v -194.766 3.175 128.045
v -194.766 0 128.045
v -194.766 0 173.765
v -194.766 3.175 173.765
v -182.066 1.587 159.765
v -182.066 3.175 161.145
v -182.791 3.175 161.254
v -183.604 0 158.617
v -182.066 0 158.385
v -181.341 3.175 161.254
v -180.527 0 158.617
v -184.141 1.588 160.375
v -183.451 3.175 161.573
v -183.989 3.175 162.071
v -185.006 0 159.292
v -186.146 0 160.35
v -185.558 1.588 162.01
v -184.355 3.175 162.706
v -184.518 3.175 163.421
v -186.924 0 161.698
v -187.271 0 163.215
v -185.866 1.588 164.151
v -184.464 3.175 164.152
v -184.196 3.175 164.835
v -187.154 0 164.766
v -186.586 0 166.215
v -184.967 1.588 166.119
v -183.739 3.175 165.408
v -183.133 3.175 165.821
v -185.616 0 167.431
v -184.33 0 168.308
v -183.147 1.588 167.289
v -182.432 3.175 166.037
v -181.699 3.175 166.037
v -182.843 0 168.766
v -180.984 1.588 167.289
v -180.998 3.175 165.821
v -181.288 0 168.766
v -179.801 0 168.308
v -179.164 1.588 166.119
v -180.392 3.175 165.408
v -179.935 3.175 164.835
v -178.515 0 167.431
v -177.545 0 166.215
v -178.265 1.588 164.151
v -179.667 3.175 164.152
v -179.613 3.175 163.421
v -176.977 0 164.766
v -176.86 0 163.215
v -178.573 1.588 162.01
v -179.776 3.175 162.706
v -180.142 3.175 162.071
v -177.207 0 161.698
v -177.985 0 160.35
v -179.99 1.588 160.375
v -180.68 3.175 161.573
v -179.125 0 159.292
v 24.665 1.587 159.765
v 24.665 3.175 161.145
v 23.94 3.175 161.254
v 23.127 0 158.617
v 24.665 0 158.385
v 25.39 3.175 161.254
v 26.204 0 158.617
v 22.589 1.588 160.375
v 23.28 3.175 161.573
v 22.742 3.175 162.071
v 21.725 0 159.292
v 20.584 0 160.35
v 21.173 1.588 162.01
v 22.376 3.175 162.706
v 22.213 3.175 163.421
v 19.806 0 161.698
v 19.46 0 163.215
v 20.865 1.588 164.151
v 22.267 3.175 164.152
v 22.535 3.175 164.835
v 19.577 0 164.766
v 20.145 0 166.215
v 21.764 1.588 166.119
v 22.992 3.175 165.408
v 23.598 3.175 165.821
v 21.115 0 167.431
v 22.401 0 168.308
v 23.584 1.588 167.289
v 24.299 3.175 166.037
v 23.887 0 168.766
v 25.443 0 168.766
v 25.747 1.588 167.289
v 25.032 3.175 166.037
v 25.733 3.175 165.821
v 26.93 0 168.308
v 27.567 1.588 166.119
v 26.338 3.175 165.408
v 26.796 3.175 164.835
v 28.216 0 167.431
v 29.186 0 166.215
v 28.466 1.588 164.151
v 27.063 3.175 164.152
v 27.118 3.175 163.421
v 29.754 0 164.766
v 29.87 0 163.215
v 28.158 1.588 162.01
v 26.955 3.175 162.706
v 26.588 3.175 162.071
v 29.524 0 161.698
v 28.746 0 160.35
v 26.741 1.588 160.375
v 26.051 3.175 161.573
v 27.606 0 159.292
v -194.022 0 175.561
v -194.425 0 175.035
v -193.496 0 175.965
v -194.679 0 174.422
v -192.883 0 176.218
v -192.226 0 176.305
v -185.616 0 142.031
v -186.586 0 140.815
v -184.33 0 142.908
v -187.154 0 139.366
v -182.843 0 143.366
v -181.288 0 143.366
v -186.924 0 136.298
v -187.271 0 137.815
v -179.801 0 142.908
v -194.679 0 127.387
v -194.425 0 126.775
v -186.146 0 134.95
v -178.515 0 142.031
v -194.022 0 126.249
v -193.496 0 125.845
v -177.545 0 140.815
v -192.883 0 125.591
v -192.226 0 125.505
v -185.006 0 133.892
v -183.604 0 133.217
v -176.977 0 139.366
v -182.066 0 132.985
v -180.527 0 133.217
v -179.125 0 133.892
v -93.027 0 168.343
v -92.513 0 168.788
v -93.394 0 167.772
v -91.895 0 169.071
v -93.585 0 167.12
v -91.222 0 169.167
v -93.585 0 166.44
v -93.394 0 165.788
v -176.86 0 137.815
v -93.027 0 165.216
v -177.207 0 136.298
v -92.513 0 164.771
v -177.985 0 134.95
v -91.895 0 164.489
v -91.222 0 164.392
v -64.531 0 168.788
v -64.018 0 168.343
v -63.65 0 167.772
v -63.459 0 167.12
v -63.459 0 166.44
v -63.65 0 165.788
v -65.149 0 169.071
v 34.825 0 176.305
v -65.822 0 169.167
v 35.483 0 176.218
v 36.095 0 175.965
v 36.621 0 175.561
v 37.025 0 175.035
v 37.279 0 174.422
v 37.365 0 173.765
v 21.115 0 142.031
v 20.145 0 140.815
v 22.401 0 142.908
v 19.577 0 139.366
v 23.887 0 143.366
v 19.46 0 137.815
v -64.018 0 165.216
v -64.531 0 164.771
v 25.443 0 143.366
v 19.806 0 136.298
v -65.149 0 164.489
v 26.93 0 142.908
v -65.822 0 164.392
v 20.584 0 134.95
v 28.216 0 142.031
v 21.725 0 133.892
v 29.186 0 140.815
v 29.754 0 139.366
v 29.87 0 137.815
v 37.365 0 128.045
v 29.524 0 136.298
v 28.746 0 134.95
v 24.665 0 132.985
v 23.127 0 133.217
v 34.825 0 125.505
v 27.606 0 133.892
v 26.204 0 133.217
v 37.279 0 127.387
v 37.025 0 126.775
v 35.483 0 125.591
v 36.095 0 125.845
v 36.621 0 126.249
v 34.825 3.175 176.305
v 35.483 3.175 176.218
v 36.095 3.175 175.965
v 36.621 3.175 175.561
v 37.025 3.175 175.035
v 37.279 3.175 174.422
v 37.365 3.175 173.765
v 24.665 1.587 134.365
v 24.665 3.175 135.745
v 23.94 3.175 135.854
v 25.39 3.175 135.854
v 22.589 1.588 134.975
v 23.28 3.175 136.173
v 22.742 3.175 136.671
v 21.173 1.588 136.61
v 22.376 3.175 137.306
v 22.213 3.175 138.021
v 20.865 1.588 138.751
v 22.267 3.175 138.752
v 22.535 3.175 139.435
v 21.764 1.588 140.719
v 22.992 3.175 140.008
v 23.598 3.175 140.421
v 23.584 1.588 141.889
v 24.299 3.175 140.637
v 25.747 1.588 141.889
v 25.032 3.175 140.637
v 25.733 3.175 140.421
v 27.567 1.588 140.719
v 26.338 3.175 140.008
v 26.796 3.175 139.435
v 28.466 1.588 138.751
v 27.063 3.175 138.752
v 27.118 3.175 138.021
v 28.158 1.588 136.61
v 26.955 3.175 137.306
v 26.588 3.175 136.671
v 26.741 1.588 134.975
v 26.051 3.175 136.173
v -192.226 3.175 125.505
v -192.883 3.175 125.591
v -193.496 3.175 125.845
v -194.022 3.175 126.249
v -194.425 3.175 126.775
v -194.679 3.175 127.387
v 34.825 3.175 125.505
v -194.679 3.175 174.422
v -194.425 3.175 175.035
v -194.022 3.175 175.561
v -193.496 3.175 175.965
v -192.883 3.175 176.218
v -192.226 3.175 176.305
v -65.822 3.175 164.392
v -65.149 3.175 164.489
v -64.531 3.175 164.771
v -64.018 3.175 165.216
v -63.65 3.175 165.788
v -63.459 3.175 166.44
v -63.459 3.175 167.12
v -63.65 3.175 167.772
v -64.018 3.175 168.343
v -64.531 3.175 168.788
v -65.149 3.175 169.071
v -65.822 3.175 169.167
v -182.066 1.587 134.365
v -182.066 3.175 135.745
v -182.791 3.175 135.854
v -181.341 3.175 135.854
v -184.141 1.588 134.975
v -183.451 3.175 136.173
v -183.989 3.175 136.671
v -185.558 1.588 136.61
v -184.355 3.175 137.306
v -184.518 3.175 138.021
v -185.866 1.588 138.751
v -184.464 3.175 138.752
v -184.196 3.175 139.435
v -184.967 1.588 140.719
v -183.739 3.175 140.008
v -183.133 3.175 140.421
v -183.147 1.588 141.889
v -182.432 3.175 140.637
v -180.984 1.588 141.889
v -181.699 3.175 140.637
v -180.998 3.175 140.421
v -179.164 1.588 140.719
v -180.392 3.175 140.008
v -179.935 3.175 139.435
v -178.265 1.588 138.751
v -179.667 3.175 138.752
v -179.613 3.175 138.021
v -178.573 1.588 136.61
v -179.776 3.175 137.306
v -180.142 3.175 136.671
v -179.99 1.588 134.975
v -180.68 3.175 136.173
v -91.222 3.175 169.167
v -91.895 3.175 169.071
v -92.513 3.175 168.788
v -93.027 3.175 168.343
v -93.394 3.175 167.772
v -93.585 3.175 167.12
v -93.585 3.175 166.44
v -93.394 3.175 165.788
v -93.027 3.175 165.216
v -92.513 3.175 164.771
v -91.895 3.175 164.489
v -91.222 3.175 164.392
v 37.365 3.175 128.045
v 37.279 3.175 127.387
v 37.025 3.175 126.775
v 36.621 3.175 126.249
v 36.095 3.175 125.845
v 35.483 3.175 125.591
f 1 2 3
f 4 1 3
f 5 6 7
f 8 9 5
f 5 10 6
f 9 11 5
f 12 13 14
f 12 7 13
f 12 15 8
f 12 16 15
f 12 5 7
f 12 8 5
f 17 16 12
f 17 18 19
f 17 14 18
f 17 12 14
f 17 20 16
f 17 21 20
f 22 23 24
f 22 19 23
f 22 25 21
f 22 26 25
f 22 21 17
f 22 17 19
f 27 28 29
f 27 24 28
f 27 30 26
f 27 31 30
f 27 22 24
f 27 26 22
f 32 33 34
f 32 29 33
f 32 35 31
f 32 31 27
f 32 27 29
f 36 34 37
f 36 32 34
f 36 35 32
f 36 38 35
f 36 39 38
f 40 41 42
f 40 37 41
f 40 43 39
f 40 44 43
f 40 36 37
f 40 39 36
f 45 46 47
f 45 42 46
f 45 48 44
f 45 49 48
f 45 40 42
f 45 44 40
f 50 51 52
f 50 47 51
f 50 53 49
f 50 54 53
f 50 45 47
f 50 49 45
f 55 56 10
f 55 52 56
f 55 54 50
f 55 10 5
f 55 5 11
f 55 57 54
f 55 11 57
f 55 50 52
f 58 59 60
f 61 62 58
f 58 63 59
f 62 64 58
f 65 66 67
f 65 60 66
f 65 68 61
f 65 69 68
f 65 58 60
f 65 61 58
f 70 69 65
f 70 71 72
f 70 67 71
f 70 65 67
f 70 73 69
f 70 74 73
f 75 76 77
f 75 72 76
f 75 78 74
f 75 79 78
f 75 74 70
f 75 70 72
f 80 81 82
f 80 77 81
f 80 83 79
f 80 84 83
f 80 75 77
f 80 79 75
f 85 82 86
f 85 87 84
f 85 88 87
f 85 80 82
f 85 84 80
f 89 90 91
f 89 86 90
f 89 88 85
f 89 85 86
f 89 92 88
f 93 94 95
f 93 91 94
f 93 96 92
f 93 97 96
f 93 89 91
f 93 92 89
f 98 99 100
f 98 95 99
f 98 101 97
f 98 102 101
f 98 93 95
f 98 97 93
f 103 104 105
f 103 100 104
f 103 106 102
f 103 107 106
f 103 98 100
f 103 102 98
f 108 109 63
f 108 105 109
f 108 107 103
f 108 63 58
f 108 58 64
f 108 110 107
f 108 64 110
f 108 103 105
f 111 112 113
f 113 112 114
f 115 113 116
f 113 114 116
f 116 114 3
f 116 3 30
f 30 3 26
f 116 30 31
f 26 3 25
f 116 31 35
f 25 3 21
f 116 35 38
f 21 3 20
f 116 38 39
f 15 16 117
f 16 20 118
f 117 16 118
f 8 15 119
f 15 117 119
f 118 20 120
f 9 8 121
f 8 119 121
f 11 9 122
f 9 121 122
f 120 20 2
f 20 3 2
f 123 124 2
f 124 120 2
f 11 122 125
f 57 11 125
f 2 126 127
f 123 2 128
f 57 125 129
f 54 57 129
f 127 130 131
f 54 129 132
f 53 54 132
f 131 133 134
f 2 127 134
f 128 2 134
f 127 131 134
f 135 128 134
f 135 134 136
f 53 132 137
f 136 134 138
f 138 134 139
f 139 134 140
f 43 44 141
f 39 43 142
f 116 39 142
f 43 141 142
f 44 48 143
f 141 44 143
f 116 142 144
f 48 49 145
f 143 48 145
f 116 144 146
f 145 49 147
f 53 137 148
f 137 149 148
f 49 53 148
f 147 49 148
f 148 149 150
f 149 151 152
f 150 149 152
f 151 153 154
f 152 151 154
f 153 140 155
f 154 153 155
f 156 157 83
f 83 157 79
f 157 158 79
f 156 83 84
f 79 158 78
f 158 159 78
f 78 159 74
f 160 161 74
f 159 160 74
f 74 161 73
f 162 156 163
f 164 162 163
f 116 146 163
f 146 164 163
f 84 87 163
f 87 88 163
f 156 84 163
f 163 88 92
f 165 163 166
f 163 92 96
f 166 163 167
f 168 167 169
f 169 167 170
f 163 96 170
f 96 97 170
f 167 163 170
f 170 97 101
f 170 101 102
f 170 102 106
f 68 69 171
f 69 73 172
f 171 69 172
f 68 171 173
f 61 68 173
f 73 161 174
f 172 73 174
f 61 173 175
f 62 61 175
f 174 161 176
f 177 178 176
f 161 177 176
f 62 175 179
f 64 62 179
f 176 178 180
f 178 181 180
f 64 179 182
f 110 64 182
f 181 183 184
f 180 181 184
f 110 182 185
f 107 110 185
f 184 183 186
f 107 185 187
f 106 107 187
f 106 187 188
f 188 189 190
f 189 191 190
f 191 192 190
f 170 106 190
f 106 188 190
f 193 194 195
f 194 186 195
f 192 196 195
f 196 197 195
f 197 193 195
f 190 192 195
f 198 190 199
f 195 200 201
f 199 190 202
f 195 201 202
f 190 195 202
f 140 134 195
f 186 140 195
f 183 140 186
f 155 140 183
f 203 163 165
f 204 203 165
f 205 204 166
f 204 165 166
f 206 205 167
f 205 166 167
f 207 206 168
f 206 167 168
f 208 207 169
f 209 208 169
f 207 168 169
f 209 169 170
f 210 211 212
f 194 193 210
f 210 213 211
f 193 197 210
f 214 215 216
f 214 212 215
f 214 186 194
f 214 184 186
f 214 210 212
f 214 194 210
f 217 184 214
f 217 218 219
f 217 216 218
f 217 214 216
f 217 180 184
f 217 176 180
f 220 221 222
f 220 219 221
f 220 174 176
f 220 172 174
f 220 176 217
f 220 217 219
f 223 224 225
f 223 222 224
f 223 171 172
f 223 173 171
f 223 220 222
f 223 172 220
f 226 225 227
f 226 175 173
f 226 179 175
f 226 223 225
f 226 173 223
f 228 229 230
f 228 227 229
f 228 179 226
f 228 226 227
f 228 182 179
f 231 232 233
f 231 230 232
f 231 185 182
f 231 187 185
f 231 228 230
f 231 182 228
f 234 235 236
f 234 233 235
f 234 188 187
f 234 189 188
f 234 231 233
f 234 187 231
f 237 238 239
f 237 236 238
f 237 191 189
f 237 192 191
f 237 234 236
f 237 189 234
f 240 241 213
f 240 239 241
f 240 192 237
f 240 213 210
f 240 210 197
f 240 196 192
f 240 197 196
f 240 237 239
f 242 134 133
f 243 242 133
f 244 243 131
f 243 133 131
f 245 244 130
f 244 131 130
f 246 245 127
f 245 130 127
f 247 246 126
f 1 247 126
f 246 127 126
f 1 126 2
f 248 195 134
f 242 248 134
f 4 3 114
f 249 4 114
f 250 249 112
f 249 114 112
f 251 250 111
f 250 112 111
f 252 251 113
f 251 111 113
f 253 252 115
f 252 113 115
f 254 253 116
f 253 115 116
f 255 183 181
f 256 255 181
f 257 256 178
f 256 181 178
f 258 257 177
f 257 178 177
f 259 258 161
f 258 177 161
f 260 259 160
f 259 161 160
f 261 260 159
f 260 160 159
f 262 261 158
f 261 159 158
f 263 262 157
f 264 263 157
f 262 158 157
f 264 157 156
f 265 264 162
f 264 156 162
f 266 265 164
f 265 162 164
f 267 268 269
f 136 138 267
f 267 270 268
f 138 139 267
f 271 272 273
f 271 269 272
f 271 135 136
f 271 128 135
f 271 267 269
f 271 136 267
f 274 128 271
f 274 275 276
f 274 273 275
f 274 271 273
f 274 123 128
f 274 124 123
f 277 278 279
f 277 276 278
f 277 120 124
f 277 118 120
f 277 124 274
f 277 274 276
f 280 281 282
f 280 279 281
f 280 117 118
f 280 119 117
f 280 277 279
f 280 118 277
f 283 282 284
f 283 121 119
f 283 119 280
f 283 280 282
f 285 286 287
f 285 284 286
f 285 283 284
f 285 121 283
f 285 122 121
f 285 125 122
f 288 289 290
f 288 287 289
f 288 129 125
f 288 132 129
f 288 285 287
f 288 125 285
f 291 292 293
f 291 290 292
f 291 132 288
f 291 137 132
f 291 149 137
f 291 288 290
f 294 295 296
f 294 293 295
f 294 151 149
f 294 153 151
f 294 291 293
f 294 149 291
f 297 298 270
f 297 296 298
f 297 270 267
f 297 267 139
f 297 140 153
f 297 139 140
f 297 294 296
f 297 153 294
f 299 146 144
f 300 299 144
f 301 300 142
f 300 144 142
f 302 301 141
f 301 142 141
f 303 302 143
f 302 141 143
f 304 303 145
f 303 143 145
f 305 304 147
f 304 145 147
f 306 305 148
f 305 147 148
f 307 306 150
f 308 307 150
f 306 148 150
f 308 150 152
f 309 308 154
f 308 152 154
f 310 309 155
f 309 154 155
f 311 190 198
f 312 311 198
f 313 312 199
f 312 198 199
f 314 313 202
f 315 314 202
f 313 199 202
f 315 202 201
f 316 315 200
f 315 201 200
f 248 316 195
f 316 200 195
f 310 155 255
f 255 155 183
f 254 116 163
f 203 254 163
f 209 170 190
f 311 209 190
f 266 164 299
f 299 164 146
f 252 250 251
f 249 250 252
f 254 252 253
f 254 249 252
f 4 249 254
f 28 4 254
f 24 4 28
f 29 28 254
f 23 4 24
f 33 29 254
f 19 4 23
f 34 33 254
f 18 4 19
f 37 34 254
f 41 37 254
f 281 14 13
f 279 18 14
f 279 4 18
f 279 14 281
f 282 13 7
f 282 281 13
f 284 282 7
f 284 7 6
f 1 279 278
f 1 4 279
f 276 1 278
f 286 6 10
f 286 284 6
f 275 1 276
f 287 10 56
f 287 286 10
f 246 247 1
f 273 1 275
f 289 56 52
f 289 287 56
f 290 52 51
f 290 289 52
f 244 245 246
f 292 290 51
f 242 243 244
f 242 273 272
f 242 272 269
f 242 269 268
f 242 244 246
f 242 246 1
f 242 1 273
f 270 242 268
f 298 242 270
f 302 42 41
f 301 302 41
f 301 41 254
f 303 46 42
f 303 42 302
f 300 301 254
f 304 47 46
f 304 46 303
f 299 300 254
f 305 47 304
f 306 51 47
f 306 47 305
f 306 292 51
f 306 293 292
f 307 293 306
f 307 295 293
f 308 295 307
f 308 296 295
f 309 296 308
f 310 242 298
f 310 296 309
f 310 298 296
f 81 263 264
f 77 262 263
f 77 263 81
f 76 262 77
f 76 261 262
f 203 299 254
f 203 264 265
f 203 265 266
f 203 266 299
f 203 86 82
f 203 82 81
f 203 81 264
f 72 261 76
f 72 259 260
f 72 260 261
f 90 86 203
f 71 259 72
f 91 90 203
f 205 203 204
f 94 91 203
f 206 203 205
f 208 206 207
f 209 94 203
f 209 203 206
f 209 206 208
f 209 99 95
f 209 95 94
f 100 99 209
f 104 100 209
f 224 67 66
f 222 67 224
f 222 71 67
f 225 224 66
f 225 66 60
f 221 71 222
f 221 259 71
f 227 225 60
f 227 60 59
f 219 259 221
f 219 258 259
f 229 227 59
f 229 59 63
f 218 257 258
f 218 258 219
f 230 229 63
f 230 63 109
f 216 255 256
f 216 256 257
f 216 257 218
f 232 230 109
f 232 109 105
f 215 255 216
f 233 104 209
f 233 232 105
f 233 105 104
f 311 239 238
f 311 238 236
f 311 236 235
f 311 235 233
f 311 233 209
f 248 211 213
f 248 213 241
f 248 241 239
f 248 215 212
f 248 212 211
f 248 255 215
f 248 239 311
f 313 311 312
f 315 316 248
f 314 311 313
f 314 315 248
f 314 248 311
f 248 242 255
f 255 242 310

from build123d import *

# Parameters (mm, degrees)
BOSS_EXTRUDE1_DEPTH                   = 3.175
F_10_0_1935_DIAMETER_HOLE1_AT_2_COUNT = 2
F_10_0_1935_DIAMETER_HOLE1_AT_2_PITCH = 25.4
F_10_0_1935_DIAMETER_HOLE1_AT_3_COUNT = 2
F_10_0_1935_DIAMETER_HOLE1_AT_3_PITCH = 208.285436421
F_10_0_1935_DIAMETER_HOLE1_AT_4_COUNT = 2
F_10_0_1935_DIAMETER_HOLE1_AT_4_PITCH = 206.730895187
CUT_EXTRUDE1_DEPTH                    = 3.175


with BuildPart() as part:
    # Sketch1 → Boss-Extrude1 (new body)
    with BuildSketch(Plane(origin=(0, 0, 0), x_dir=(1, 0, 0), z_dir=(0, 1, 0))):
        with BuildLine():
            Line((34.825366444, -125.50484625), (-192.225528743, -125.50484625))
            ThreePointArc((-192.225528743, -125.50484625), (-194.021579967, -126.248795026), (-194.765528743, -128.04484625))
            Line((-194.765528743, -128.04484625), (-194.765528743, -173.76484625))
            ThreePointArc((-194.765528743, -173.76484625), (-194.021579967, -175.560897474), (-192.225528743, -176.30484625))
            Line((-192.225528743, -176.30484625), (34.825366444, -176.30484625))
            ThreePointArc((34.825366444, -176.30484625), (36.621417669, -175.560897474), (37.365366444, -173.76484625))
            Line((37.365366444, -173.76484625), (37.365366444, -128.04484625))
            ThreePointArc((37.365366444, -128.04484625), (36.621417669, -126.248795026), (34.825366444, -125.50484625))
        make_face()
    extrude(amount=BOSS_EXTRUDE1_DEPTH)

    # Sketch4 → #10 (0.1935) Diameter Hole1 (revolve, cut)
    with BuildSketch(Plane(origin=(24.665366444, 0, 163.60484625), x_dir=(0, 0, -1), z_dir=(1, 0, 0))):
        Polygon((0, 0), (0, 3.175), (2.45745, 3.175), (2.45745, 3.177605133), (5.2197, 0), align=None)
    f_10_0_1935_diameter_hole1 = revolve(axis=Axis((24.665366444, -6.35, 163.60484625), (0, 1, 0)), mode=Mode.SUBTRACT)

    # #10 (0.1935) Diameter Hole1 at 2: #10 (0.1935) Diameter Hole1 ×2
    with Locations(*[(0, 0, -i * F_10_0_1935_DIAMETER_HOLE1_AT_2_PITCH) for i in range(1, F_10_0_1935_DIAMETER_HOLE1_AT_2_COUNT)]):
        add(f_10_0_1935_diameter_hole1, mode=Mode.SUBTRACT)

    # #10 (0.1935) Diameter Hole1 at 3: #10 (0.1935) Diameter Hole1 ×2
    with Locations(*[Vector(-0.9925364861794038, 0, -0.12194803648539032) * (i * F_10_0_1935_DIAMETER_HOLE1_AT_3_PITCH) for i in range(1, F_10_0_1935_DIAMETER_HOLE1_AT_3_COUNT)]):
        add(f_10_0_1935_diameter_hole1, mode=Mode.SUBTRACT)

    # #10 (0.1935) Diameter Hole1 at 4: #10 (0.1935) Diameter Hole1 ×2
    with Locations(*[(-i * F_10_0_1935_DIAMETER_HOLE1_AT_4_PITCH, 0, 0) for i in range(1, F_10_0_1935_DIAMETER_HOLE1_AT_4_COUNT)]):
        add(f_10_0_1935_diameter_hole1, mode=Mode.SUBTRACT)

    # Sketch6 → Cut-Extrude1 (cut)
    with BuildSketch(Plane.XZ):
        with BuildLine():
            Line((-65.822128749, 169.16744625), (-91.222128749, 169.16744625))
            ThreePointArc((-91.222128749, 169.16744625), (-93.609728749, 166.77984625), (-91.222128749, 164.39224625))
            Line((-91.222128749, 164.39224625), (-65.822128749, 164.39224625))
            ThreePointArc((-65.822128749, 164.39224625), (-63.434528749, 166.77984625), (-65.822128749, 169.16744625))
        make_face()
    extrude(amount=-CUT_EXTRUDE1_DEPTH, mode=Mode.SUBTRACT)


solid = part.part
